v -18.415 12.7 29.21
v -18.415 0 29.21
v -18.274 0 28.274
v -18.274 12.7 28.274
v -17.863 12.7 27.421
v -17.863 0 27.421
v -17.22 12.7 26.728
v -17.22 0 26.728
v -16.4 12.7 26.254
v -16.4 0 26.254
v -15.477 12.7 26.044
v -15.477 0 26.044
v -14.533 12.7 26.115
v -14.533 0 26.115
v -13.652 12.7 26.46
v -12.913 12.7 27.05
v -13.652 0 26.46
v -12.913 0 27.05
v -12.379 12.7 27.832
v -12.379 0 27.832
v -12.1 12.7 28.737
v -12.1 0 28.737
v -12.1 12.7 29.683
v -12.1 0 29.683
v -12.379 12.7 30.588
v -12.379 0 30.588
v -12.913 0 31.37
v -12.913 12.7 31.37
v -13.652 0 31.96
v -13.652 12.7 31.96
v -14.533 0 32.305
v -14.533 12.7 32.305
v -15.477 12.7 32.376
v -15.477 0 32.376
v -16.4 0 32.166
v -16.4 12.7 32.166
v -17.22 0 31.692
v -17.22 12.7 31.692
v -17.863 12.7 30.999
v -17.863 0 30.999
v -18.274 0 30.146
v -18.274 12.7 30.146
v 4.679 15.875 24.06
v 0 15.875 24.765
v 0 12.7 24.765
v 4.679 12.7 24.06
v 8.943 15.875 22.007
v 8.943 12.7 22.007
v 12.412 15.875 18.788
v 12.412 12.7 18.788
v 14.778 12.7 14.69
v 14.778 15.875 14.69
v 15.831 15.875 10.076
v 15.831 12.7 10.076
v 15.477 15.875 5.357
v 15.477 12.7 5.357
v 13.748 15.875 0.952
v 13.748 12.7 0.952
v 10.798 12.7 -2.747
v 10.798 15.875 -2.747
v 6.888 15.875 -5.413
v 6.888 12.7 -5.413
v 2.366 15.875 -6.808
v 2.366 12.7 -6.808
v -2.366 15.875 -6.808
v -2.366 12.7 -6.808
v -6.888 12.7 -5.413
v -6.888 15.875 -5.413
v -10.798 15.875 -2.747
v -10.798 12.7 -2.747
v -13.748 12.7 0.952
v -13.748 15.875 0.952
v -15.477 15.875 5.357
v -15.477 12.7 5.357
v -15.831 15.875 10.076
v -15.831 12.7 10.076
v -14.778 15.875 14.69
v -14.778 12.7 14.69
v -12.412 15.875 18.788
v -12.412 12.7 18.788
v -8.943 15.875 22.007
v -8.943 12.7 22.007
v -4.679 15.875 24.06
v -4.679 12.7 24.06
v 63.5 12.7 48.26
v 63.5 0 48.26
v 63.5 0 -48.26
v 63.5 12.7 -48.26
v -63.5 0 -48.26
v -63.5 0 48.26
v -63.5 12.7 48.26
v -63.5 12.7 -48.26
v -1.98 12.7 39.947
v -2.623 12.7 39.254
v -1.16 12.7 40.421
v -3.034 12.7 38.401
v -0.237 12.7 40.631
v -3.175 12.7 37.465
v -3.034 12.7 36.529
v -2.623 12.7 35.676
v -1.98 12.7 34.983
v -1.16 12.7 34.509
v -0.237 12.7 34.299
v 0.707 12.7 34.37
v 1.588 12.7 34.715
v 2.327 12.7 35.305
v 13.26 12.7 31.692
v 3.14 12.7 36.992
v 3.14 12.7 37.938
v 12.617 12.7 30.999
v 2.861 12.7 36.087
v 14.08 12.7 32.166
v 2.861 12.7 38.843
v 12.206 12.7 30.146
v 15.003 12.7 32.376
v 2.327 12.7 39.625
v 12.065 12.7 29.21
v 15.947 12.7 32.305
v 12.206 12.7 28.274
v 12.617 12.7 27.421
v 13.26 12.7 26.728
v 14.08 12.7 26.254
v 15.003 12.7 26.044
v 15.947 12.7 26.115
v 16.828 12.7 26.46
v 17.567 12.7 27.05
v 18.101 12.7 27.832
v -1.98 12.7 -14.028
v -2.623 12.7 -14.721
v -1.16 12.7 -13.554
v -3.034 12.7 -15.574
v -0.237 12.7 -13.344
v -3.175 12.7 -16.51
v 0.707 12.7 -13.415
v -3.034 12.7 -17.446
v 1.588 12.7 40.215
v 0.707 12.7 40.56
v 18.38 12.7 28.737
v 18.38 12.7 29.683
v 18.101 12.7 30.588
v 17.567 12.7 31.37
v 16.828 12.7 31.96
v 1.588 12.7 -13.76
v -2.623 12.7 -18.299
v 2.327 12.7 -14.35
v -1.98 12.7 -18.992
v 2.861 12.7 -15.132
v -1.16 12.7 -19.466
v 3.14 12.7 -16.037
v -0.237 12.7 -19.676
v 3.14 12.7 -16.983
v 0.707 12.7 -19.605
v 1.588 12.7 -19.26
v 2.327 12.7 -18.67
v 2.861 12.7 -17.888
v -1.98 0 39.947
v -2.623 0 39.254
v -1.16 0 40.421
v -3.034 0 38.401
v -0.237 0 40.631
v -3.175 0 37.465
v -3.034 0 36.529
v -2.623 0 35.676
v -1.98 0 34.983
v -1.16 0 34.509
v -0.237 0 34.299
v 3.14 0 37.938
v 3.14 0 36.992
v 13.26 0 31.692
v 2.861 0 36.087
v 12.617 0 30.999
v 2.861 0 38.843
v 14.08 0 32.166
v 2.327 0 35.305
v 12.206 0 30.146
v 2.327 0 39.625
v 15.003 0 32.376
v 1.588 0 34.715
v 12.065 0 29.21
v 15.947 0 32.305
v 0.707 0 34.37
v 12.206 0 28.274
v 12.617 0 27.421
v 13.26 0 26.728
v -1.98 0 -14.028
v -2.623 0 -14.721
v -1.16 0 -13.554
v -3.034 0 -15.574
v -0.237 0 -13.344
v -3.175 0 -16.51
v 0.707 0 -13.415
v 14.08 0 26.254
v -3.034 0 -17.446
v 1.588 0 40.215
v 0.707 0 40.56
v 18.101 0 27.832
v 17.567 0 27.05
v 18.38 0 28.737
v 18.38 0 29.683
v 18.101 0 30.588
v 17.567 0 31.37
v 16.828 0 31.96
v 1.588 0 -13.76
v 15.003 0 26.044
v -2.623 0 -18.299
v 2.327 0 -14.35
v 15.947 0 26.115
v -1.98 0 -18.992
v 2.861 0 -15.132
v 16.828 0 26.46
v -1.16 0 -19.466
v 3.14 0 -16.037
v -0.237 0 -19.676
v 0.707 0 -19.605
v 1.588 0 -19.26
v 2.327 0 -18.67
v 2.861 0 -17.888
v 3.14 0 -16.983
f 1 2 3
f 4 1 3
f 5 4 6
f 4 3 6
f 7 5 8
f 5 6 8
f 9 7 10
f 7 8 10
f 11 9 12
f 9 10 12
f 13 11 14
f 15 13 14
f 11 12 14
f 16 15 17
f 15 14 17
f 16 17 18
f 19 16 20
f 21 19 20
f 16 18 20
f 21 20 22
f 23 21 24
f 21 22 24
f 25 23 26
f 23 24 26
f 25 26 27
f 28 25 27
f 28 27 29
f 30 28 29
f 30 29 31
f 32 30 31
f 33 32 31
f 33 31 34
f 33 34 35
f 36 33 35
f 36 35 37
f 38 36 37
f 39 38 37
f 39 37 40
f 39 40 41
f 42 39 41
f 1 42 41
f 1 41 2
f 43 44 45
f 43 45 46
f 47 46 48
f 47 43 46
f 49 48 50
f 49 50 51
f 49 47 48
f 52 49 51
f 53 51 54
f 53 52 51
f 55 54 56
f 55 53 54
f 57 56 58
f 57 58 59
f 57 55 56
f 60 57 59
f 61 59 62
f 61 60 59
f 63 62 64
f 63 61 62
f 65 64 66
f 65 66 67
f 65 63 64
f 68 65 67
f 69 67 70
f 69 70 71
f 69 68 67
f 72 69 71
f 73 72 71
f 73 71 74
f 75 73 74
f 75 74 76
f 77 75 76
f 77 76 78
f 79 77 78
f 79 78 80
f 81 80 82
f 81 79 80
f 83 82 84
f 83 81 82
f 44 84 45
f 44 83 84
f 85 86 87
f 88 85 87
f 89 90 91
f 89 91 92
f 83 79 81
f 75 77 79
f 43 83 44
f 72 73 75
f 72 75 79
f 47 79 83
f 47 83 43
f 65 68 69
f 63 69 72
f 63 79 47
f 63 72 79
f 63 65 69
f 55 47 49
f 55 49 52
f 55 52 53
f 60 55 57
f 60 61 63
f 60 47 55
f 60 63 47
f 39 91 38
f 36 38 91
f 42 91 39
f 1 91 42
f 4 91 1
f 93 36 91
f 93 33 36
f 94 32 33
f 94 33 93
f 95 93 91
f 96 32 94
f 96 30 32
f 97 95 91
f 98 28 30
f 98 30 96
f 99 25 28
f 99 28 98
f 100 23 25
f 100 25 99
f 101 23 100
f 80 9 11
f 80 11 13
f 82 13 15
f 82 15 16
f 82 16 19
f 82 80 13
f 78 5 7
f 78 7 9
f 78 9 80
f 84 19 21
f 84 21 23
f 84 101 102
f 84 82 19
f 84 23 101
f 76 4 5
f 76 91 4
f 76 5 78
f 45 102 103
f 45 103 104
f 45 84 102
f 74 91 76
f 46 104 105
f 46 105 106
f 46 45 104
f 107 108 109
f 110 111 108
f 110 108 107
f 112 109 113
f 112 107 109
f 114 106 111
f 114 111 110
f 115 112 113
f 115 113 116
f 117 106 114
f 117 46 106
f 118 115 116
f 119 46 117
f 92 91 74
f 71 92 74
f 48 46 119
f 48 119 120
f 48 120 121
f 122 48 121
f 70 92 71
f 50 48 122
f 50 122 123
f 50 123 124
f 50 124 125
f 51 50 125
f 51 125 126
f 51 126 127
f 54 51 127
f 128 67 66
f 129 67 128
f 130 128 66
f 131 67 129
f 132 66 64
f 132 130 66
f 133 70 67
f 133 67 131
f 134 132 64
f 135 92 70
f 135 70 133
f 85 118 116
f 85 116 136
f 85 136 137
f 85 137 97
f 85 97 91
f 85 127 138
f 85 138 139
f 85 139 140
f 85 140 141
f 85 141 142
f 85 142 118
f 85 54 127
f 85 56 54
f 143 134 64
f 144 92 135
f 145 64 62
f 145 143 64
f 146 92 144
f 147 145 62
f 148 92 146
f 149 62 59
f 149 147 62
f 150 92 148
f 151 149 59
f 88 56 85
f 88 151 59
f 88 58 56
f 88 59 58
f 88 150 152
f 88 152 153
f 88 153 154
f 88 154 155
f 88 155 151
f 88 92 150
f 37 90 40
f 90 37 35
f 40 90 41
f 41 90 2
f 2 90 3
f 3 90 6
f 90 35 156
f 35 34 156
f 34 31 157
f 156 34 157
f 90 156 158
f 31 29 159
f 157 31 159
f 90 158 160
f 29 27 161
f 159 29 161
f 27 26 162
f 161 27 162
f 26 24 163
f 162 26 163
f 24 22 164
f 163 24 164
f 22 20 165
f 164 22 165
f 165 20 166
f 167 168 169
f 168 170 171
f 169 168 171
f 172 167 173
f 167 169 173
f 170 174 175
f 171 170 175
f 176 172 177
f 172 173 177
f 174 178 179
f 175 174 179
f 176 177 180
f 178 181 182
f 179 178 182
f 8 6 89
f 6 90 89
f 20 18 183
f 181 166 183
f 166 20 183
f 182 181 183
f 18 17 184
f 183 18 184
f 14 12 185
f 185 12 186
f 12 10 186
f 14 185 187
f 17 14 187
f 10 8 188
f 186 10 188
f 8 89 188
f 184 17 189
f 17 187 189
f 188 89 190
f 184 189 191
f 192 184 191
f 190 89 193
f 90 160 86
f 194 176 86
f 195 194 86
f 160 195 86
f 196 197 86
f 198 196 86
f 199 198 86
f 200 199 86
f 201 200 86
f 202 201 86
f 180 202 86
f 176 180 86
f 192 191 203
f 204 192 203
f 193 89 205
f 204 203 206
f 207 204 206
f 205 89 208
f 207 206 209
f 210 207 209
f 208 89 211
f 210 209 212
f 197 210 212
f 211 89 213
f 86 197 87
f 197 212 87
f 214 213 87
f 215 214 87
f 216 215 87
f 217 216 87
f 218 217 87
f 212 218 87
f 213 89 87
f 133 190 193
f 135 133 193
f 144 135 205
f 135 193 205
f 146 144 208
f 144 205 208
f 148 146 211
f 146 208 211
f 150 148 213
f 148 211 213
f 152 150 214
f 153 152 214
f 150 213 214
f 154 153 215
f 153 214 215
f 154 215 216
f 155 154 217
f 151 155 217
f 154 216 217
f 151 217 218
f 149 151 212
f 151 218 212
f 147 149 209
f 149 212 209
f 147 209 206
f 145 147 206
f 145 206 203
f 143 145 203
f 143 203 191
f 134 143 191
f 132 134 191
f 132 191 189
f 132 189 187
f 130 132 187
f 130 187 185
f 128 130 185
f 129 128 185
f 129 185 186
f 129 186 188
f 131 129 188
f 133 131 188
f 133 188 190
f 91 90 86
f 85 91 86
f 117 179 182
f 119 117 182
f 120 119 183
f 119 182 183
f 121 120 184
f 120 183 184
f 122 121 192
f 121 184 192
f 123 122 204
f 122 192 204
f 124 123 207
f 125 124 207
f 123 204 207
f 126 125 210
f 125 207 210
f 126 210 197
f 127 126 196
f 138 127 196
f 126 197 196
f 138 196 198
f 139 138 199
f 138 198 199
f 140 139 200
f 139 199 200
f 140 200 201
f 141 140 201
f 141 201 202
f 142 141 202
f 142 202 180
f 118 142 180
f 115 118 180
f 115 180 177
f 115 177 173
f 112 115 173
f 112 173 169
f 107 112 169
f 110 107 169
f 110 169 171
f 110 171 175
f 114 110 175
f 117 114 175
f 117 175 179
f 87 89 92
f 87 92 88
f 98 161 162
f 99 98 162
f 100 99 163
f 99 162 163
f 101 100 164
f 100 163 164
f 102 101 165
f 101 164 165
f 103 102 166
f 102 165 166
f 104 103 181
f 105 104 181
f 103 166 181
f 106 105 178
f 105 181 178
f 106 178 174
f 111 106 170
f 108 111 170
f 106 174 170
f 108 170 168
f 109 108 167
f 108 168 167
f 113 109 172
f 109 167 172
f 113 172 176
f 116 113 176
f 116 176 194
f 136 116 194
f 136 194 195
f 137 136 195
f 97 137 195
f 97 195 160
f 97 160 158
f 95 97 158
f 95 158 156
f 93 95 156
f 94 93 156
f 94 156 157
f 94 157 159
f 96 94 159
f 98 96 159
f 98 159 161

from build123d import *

# Parameters (mm, degrees)
SKETCH1_W                   = 127
SKETCH1_H                   = 96.52
BOSS_EXTRUDE1_DEPTH         = 15.875
SKETCH2_W                   = 127
SKETCH2_H                   = 96.52
SKETCH2_R                   = 15.875
CUT_EXTRUDE1_DEPTH          = 3.175
F_1_4_0_25_DIAMETER_HOLE1_D = 6.35


with BuildPart() as part:
    # Sketch1 → Boss-Extrude1 (new body)
    with BuildSketch(Plane(origin=(0, 0, 0), x_dir=(1, 0, 0), z_dir=(0, 1, 0))):
        Rectangle(SKETCH1_W, SKETCH1_H)
    extrude(amount=BOSS_EXTRUDE1_DEPTH)

    # Sketch2 → Cut-Extrude1 (cut)
    with BuildSketch(Plane(origin=(0, 15.875, 0), x_dir=(1, 0, 0), z_dir=(0, 1, 0))):
        Rectangle(SKETCH2_W, SKETCH2_H)
        with Locations(Location((0, -8.89, 0), (0, 0, 270))):
            Circle(SKETCH2_R, mode=Mode.SUBTRACT)
    extrude(amount=-CUT_EXTRUDE1_DEPTH, mode=Mode.SUBTRACT)

    # 1/4 (0.25) Diameter Hole1 (through all)
    with Locations(Plane(origin=(0, 12.7, 0), x_dir=(1, 0, 0), z_dir=(0, 1, 0))):
        with Locations((15.24, -29.21), (0, -37.465), (0, 16.51), (-15.24, -29.21)):
            Hole(F_1_4_0_25_DIAMETER_HOLE1_D / 2)


solid = part.part
